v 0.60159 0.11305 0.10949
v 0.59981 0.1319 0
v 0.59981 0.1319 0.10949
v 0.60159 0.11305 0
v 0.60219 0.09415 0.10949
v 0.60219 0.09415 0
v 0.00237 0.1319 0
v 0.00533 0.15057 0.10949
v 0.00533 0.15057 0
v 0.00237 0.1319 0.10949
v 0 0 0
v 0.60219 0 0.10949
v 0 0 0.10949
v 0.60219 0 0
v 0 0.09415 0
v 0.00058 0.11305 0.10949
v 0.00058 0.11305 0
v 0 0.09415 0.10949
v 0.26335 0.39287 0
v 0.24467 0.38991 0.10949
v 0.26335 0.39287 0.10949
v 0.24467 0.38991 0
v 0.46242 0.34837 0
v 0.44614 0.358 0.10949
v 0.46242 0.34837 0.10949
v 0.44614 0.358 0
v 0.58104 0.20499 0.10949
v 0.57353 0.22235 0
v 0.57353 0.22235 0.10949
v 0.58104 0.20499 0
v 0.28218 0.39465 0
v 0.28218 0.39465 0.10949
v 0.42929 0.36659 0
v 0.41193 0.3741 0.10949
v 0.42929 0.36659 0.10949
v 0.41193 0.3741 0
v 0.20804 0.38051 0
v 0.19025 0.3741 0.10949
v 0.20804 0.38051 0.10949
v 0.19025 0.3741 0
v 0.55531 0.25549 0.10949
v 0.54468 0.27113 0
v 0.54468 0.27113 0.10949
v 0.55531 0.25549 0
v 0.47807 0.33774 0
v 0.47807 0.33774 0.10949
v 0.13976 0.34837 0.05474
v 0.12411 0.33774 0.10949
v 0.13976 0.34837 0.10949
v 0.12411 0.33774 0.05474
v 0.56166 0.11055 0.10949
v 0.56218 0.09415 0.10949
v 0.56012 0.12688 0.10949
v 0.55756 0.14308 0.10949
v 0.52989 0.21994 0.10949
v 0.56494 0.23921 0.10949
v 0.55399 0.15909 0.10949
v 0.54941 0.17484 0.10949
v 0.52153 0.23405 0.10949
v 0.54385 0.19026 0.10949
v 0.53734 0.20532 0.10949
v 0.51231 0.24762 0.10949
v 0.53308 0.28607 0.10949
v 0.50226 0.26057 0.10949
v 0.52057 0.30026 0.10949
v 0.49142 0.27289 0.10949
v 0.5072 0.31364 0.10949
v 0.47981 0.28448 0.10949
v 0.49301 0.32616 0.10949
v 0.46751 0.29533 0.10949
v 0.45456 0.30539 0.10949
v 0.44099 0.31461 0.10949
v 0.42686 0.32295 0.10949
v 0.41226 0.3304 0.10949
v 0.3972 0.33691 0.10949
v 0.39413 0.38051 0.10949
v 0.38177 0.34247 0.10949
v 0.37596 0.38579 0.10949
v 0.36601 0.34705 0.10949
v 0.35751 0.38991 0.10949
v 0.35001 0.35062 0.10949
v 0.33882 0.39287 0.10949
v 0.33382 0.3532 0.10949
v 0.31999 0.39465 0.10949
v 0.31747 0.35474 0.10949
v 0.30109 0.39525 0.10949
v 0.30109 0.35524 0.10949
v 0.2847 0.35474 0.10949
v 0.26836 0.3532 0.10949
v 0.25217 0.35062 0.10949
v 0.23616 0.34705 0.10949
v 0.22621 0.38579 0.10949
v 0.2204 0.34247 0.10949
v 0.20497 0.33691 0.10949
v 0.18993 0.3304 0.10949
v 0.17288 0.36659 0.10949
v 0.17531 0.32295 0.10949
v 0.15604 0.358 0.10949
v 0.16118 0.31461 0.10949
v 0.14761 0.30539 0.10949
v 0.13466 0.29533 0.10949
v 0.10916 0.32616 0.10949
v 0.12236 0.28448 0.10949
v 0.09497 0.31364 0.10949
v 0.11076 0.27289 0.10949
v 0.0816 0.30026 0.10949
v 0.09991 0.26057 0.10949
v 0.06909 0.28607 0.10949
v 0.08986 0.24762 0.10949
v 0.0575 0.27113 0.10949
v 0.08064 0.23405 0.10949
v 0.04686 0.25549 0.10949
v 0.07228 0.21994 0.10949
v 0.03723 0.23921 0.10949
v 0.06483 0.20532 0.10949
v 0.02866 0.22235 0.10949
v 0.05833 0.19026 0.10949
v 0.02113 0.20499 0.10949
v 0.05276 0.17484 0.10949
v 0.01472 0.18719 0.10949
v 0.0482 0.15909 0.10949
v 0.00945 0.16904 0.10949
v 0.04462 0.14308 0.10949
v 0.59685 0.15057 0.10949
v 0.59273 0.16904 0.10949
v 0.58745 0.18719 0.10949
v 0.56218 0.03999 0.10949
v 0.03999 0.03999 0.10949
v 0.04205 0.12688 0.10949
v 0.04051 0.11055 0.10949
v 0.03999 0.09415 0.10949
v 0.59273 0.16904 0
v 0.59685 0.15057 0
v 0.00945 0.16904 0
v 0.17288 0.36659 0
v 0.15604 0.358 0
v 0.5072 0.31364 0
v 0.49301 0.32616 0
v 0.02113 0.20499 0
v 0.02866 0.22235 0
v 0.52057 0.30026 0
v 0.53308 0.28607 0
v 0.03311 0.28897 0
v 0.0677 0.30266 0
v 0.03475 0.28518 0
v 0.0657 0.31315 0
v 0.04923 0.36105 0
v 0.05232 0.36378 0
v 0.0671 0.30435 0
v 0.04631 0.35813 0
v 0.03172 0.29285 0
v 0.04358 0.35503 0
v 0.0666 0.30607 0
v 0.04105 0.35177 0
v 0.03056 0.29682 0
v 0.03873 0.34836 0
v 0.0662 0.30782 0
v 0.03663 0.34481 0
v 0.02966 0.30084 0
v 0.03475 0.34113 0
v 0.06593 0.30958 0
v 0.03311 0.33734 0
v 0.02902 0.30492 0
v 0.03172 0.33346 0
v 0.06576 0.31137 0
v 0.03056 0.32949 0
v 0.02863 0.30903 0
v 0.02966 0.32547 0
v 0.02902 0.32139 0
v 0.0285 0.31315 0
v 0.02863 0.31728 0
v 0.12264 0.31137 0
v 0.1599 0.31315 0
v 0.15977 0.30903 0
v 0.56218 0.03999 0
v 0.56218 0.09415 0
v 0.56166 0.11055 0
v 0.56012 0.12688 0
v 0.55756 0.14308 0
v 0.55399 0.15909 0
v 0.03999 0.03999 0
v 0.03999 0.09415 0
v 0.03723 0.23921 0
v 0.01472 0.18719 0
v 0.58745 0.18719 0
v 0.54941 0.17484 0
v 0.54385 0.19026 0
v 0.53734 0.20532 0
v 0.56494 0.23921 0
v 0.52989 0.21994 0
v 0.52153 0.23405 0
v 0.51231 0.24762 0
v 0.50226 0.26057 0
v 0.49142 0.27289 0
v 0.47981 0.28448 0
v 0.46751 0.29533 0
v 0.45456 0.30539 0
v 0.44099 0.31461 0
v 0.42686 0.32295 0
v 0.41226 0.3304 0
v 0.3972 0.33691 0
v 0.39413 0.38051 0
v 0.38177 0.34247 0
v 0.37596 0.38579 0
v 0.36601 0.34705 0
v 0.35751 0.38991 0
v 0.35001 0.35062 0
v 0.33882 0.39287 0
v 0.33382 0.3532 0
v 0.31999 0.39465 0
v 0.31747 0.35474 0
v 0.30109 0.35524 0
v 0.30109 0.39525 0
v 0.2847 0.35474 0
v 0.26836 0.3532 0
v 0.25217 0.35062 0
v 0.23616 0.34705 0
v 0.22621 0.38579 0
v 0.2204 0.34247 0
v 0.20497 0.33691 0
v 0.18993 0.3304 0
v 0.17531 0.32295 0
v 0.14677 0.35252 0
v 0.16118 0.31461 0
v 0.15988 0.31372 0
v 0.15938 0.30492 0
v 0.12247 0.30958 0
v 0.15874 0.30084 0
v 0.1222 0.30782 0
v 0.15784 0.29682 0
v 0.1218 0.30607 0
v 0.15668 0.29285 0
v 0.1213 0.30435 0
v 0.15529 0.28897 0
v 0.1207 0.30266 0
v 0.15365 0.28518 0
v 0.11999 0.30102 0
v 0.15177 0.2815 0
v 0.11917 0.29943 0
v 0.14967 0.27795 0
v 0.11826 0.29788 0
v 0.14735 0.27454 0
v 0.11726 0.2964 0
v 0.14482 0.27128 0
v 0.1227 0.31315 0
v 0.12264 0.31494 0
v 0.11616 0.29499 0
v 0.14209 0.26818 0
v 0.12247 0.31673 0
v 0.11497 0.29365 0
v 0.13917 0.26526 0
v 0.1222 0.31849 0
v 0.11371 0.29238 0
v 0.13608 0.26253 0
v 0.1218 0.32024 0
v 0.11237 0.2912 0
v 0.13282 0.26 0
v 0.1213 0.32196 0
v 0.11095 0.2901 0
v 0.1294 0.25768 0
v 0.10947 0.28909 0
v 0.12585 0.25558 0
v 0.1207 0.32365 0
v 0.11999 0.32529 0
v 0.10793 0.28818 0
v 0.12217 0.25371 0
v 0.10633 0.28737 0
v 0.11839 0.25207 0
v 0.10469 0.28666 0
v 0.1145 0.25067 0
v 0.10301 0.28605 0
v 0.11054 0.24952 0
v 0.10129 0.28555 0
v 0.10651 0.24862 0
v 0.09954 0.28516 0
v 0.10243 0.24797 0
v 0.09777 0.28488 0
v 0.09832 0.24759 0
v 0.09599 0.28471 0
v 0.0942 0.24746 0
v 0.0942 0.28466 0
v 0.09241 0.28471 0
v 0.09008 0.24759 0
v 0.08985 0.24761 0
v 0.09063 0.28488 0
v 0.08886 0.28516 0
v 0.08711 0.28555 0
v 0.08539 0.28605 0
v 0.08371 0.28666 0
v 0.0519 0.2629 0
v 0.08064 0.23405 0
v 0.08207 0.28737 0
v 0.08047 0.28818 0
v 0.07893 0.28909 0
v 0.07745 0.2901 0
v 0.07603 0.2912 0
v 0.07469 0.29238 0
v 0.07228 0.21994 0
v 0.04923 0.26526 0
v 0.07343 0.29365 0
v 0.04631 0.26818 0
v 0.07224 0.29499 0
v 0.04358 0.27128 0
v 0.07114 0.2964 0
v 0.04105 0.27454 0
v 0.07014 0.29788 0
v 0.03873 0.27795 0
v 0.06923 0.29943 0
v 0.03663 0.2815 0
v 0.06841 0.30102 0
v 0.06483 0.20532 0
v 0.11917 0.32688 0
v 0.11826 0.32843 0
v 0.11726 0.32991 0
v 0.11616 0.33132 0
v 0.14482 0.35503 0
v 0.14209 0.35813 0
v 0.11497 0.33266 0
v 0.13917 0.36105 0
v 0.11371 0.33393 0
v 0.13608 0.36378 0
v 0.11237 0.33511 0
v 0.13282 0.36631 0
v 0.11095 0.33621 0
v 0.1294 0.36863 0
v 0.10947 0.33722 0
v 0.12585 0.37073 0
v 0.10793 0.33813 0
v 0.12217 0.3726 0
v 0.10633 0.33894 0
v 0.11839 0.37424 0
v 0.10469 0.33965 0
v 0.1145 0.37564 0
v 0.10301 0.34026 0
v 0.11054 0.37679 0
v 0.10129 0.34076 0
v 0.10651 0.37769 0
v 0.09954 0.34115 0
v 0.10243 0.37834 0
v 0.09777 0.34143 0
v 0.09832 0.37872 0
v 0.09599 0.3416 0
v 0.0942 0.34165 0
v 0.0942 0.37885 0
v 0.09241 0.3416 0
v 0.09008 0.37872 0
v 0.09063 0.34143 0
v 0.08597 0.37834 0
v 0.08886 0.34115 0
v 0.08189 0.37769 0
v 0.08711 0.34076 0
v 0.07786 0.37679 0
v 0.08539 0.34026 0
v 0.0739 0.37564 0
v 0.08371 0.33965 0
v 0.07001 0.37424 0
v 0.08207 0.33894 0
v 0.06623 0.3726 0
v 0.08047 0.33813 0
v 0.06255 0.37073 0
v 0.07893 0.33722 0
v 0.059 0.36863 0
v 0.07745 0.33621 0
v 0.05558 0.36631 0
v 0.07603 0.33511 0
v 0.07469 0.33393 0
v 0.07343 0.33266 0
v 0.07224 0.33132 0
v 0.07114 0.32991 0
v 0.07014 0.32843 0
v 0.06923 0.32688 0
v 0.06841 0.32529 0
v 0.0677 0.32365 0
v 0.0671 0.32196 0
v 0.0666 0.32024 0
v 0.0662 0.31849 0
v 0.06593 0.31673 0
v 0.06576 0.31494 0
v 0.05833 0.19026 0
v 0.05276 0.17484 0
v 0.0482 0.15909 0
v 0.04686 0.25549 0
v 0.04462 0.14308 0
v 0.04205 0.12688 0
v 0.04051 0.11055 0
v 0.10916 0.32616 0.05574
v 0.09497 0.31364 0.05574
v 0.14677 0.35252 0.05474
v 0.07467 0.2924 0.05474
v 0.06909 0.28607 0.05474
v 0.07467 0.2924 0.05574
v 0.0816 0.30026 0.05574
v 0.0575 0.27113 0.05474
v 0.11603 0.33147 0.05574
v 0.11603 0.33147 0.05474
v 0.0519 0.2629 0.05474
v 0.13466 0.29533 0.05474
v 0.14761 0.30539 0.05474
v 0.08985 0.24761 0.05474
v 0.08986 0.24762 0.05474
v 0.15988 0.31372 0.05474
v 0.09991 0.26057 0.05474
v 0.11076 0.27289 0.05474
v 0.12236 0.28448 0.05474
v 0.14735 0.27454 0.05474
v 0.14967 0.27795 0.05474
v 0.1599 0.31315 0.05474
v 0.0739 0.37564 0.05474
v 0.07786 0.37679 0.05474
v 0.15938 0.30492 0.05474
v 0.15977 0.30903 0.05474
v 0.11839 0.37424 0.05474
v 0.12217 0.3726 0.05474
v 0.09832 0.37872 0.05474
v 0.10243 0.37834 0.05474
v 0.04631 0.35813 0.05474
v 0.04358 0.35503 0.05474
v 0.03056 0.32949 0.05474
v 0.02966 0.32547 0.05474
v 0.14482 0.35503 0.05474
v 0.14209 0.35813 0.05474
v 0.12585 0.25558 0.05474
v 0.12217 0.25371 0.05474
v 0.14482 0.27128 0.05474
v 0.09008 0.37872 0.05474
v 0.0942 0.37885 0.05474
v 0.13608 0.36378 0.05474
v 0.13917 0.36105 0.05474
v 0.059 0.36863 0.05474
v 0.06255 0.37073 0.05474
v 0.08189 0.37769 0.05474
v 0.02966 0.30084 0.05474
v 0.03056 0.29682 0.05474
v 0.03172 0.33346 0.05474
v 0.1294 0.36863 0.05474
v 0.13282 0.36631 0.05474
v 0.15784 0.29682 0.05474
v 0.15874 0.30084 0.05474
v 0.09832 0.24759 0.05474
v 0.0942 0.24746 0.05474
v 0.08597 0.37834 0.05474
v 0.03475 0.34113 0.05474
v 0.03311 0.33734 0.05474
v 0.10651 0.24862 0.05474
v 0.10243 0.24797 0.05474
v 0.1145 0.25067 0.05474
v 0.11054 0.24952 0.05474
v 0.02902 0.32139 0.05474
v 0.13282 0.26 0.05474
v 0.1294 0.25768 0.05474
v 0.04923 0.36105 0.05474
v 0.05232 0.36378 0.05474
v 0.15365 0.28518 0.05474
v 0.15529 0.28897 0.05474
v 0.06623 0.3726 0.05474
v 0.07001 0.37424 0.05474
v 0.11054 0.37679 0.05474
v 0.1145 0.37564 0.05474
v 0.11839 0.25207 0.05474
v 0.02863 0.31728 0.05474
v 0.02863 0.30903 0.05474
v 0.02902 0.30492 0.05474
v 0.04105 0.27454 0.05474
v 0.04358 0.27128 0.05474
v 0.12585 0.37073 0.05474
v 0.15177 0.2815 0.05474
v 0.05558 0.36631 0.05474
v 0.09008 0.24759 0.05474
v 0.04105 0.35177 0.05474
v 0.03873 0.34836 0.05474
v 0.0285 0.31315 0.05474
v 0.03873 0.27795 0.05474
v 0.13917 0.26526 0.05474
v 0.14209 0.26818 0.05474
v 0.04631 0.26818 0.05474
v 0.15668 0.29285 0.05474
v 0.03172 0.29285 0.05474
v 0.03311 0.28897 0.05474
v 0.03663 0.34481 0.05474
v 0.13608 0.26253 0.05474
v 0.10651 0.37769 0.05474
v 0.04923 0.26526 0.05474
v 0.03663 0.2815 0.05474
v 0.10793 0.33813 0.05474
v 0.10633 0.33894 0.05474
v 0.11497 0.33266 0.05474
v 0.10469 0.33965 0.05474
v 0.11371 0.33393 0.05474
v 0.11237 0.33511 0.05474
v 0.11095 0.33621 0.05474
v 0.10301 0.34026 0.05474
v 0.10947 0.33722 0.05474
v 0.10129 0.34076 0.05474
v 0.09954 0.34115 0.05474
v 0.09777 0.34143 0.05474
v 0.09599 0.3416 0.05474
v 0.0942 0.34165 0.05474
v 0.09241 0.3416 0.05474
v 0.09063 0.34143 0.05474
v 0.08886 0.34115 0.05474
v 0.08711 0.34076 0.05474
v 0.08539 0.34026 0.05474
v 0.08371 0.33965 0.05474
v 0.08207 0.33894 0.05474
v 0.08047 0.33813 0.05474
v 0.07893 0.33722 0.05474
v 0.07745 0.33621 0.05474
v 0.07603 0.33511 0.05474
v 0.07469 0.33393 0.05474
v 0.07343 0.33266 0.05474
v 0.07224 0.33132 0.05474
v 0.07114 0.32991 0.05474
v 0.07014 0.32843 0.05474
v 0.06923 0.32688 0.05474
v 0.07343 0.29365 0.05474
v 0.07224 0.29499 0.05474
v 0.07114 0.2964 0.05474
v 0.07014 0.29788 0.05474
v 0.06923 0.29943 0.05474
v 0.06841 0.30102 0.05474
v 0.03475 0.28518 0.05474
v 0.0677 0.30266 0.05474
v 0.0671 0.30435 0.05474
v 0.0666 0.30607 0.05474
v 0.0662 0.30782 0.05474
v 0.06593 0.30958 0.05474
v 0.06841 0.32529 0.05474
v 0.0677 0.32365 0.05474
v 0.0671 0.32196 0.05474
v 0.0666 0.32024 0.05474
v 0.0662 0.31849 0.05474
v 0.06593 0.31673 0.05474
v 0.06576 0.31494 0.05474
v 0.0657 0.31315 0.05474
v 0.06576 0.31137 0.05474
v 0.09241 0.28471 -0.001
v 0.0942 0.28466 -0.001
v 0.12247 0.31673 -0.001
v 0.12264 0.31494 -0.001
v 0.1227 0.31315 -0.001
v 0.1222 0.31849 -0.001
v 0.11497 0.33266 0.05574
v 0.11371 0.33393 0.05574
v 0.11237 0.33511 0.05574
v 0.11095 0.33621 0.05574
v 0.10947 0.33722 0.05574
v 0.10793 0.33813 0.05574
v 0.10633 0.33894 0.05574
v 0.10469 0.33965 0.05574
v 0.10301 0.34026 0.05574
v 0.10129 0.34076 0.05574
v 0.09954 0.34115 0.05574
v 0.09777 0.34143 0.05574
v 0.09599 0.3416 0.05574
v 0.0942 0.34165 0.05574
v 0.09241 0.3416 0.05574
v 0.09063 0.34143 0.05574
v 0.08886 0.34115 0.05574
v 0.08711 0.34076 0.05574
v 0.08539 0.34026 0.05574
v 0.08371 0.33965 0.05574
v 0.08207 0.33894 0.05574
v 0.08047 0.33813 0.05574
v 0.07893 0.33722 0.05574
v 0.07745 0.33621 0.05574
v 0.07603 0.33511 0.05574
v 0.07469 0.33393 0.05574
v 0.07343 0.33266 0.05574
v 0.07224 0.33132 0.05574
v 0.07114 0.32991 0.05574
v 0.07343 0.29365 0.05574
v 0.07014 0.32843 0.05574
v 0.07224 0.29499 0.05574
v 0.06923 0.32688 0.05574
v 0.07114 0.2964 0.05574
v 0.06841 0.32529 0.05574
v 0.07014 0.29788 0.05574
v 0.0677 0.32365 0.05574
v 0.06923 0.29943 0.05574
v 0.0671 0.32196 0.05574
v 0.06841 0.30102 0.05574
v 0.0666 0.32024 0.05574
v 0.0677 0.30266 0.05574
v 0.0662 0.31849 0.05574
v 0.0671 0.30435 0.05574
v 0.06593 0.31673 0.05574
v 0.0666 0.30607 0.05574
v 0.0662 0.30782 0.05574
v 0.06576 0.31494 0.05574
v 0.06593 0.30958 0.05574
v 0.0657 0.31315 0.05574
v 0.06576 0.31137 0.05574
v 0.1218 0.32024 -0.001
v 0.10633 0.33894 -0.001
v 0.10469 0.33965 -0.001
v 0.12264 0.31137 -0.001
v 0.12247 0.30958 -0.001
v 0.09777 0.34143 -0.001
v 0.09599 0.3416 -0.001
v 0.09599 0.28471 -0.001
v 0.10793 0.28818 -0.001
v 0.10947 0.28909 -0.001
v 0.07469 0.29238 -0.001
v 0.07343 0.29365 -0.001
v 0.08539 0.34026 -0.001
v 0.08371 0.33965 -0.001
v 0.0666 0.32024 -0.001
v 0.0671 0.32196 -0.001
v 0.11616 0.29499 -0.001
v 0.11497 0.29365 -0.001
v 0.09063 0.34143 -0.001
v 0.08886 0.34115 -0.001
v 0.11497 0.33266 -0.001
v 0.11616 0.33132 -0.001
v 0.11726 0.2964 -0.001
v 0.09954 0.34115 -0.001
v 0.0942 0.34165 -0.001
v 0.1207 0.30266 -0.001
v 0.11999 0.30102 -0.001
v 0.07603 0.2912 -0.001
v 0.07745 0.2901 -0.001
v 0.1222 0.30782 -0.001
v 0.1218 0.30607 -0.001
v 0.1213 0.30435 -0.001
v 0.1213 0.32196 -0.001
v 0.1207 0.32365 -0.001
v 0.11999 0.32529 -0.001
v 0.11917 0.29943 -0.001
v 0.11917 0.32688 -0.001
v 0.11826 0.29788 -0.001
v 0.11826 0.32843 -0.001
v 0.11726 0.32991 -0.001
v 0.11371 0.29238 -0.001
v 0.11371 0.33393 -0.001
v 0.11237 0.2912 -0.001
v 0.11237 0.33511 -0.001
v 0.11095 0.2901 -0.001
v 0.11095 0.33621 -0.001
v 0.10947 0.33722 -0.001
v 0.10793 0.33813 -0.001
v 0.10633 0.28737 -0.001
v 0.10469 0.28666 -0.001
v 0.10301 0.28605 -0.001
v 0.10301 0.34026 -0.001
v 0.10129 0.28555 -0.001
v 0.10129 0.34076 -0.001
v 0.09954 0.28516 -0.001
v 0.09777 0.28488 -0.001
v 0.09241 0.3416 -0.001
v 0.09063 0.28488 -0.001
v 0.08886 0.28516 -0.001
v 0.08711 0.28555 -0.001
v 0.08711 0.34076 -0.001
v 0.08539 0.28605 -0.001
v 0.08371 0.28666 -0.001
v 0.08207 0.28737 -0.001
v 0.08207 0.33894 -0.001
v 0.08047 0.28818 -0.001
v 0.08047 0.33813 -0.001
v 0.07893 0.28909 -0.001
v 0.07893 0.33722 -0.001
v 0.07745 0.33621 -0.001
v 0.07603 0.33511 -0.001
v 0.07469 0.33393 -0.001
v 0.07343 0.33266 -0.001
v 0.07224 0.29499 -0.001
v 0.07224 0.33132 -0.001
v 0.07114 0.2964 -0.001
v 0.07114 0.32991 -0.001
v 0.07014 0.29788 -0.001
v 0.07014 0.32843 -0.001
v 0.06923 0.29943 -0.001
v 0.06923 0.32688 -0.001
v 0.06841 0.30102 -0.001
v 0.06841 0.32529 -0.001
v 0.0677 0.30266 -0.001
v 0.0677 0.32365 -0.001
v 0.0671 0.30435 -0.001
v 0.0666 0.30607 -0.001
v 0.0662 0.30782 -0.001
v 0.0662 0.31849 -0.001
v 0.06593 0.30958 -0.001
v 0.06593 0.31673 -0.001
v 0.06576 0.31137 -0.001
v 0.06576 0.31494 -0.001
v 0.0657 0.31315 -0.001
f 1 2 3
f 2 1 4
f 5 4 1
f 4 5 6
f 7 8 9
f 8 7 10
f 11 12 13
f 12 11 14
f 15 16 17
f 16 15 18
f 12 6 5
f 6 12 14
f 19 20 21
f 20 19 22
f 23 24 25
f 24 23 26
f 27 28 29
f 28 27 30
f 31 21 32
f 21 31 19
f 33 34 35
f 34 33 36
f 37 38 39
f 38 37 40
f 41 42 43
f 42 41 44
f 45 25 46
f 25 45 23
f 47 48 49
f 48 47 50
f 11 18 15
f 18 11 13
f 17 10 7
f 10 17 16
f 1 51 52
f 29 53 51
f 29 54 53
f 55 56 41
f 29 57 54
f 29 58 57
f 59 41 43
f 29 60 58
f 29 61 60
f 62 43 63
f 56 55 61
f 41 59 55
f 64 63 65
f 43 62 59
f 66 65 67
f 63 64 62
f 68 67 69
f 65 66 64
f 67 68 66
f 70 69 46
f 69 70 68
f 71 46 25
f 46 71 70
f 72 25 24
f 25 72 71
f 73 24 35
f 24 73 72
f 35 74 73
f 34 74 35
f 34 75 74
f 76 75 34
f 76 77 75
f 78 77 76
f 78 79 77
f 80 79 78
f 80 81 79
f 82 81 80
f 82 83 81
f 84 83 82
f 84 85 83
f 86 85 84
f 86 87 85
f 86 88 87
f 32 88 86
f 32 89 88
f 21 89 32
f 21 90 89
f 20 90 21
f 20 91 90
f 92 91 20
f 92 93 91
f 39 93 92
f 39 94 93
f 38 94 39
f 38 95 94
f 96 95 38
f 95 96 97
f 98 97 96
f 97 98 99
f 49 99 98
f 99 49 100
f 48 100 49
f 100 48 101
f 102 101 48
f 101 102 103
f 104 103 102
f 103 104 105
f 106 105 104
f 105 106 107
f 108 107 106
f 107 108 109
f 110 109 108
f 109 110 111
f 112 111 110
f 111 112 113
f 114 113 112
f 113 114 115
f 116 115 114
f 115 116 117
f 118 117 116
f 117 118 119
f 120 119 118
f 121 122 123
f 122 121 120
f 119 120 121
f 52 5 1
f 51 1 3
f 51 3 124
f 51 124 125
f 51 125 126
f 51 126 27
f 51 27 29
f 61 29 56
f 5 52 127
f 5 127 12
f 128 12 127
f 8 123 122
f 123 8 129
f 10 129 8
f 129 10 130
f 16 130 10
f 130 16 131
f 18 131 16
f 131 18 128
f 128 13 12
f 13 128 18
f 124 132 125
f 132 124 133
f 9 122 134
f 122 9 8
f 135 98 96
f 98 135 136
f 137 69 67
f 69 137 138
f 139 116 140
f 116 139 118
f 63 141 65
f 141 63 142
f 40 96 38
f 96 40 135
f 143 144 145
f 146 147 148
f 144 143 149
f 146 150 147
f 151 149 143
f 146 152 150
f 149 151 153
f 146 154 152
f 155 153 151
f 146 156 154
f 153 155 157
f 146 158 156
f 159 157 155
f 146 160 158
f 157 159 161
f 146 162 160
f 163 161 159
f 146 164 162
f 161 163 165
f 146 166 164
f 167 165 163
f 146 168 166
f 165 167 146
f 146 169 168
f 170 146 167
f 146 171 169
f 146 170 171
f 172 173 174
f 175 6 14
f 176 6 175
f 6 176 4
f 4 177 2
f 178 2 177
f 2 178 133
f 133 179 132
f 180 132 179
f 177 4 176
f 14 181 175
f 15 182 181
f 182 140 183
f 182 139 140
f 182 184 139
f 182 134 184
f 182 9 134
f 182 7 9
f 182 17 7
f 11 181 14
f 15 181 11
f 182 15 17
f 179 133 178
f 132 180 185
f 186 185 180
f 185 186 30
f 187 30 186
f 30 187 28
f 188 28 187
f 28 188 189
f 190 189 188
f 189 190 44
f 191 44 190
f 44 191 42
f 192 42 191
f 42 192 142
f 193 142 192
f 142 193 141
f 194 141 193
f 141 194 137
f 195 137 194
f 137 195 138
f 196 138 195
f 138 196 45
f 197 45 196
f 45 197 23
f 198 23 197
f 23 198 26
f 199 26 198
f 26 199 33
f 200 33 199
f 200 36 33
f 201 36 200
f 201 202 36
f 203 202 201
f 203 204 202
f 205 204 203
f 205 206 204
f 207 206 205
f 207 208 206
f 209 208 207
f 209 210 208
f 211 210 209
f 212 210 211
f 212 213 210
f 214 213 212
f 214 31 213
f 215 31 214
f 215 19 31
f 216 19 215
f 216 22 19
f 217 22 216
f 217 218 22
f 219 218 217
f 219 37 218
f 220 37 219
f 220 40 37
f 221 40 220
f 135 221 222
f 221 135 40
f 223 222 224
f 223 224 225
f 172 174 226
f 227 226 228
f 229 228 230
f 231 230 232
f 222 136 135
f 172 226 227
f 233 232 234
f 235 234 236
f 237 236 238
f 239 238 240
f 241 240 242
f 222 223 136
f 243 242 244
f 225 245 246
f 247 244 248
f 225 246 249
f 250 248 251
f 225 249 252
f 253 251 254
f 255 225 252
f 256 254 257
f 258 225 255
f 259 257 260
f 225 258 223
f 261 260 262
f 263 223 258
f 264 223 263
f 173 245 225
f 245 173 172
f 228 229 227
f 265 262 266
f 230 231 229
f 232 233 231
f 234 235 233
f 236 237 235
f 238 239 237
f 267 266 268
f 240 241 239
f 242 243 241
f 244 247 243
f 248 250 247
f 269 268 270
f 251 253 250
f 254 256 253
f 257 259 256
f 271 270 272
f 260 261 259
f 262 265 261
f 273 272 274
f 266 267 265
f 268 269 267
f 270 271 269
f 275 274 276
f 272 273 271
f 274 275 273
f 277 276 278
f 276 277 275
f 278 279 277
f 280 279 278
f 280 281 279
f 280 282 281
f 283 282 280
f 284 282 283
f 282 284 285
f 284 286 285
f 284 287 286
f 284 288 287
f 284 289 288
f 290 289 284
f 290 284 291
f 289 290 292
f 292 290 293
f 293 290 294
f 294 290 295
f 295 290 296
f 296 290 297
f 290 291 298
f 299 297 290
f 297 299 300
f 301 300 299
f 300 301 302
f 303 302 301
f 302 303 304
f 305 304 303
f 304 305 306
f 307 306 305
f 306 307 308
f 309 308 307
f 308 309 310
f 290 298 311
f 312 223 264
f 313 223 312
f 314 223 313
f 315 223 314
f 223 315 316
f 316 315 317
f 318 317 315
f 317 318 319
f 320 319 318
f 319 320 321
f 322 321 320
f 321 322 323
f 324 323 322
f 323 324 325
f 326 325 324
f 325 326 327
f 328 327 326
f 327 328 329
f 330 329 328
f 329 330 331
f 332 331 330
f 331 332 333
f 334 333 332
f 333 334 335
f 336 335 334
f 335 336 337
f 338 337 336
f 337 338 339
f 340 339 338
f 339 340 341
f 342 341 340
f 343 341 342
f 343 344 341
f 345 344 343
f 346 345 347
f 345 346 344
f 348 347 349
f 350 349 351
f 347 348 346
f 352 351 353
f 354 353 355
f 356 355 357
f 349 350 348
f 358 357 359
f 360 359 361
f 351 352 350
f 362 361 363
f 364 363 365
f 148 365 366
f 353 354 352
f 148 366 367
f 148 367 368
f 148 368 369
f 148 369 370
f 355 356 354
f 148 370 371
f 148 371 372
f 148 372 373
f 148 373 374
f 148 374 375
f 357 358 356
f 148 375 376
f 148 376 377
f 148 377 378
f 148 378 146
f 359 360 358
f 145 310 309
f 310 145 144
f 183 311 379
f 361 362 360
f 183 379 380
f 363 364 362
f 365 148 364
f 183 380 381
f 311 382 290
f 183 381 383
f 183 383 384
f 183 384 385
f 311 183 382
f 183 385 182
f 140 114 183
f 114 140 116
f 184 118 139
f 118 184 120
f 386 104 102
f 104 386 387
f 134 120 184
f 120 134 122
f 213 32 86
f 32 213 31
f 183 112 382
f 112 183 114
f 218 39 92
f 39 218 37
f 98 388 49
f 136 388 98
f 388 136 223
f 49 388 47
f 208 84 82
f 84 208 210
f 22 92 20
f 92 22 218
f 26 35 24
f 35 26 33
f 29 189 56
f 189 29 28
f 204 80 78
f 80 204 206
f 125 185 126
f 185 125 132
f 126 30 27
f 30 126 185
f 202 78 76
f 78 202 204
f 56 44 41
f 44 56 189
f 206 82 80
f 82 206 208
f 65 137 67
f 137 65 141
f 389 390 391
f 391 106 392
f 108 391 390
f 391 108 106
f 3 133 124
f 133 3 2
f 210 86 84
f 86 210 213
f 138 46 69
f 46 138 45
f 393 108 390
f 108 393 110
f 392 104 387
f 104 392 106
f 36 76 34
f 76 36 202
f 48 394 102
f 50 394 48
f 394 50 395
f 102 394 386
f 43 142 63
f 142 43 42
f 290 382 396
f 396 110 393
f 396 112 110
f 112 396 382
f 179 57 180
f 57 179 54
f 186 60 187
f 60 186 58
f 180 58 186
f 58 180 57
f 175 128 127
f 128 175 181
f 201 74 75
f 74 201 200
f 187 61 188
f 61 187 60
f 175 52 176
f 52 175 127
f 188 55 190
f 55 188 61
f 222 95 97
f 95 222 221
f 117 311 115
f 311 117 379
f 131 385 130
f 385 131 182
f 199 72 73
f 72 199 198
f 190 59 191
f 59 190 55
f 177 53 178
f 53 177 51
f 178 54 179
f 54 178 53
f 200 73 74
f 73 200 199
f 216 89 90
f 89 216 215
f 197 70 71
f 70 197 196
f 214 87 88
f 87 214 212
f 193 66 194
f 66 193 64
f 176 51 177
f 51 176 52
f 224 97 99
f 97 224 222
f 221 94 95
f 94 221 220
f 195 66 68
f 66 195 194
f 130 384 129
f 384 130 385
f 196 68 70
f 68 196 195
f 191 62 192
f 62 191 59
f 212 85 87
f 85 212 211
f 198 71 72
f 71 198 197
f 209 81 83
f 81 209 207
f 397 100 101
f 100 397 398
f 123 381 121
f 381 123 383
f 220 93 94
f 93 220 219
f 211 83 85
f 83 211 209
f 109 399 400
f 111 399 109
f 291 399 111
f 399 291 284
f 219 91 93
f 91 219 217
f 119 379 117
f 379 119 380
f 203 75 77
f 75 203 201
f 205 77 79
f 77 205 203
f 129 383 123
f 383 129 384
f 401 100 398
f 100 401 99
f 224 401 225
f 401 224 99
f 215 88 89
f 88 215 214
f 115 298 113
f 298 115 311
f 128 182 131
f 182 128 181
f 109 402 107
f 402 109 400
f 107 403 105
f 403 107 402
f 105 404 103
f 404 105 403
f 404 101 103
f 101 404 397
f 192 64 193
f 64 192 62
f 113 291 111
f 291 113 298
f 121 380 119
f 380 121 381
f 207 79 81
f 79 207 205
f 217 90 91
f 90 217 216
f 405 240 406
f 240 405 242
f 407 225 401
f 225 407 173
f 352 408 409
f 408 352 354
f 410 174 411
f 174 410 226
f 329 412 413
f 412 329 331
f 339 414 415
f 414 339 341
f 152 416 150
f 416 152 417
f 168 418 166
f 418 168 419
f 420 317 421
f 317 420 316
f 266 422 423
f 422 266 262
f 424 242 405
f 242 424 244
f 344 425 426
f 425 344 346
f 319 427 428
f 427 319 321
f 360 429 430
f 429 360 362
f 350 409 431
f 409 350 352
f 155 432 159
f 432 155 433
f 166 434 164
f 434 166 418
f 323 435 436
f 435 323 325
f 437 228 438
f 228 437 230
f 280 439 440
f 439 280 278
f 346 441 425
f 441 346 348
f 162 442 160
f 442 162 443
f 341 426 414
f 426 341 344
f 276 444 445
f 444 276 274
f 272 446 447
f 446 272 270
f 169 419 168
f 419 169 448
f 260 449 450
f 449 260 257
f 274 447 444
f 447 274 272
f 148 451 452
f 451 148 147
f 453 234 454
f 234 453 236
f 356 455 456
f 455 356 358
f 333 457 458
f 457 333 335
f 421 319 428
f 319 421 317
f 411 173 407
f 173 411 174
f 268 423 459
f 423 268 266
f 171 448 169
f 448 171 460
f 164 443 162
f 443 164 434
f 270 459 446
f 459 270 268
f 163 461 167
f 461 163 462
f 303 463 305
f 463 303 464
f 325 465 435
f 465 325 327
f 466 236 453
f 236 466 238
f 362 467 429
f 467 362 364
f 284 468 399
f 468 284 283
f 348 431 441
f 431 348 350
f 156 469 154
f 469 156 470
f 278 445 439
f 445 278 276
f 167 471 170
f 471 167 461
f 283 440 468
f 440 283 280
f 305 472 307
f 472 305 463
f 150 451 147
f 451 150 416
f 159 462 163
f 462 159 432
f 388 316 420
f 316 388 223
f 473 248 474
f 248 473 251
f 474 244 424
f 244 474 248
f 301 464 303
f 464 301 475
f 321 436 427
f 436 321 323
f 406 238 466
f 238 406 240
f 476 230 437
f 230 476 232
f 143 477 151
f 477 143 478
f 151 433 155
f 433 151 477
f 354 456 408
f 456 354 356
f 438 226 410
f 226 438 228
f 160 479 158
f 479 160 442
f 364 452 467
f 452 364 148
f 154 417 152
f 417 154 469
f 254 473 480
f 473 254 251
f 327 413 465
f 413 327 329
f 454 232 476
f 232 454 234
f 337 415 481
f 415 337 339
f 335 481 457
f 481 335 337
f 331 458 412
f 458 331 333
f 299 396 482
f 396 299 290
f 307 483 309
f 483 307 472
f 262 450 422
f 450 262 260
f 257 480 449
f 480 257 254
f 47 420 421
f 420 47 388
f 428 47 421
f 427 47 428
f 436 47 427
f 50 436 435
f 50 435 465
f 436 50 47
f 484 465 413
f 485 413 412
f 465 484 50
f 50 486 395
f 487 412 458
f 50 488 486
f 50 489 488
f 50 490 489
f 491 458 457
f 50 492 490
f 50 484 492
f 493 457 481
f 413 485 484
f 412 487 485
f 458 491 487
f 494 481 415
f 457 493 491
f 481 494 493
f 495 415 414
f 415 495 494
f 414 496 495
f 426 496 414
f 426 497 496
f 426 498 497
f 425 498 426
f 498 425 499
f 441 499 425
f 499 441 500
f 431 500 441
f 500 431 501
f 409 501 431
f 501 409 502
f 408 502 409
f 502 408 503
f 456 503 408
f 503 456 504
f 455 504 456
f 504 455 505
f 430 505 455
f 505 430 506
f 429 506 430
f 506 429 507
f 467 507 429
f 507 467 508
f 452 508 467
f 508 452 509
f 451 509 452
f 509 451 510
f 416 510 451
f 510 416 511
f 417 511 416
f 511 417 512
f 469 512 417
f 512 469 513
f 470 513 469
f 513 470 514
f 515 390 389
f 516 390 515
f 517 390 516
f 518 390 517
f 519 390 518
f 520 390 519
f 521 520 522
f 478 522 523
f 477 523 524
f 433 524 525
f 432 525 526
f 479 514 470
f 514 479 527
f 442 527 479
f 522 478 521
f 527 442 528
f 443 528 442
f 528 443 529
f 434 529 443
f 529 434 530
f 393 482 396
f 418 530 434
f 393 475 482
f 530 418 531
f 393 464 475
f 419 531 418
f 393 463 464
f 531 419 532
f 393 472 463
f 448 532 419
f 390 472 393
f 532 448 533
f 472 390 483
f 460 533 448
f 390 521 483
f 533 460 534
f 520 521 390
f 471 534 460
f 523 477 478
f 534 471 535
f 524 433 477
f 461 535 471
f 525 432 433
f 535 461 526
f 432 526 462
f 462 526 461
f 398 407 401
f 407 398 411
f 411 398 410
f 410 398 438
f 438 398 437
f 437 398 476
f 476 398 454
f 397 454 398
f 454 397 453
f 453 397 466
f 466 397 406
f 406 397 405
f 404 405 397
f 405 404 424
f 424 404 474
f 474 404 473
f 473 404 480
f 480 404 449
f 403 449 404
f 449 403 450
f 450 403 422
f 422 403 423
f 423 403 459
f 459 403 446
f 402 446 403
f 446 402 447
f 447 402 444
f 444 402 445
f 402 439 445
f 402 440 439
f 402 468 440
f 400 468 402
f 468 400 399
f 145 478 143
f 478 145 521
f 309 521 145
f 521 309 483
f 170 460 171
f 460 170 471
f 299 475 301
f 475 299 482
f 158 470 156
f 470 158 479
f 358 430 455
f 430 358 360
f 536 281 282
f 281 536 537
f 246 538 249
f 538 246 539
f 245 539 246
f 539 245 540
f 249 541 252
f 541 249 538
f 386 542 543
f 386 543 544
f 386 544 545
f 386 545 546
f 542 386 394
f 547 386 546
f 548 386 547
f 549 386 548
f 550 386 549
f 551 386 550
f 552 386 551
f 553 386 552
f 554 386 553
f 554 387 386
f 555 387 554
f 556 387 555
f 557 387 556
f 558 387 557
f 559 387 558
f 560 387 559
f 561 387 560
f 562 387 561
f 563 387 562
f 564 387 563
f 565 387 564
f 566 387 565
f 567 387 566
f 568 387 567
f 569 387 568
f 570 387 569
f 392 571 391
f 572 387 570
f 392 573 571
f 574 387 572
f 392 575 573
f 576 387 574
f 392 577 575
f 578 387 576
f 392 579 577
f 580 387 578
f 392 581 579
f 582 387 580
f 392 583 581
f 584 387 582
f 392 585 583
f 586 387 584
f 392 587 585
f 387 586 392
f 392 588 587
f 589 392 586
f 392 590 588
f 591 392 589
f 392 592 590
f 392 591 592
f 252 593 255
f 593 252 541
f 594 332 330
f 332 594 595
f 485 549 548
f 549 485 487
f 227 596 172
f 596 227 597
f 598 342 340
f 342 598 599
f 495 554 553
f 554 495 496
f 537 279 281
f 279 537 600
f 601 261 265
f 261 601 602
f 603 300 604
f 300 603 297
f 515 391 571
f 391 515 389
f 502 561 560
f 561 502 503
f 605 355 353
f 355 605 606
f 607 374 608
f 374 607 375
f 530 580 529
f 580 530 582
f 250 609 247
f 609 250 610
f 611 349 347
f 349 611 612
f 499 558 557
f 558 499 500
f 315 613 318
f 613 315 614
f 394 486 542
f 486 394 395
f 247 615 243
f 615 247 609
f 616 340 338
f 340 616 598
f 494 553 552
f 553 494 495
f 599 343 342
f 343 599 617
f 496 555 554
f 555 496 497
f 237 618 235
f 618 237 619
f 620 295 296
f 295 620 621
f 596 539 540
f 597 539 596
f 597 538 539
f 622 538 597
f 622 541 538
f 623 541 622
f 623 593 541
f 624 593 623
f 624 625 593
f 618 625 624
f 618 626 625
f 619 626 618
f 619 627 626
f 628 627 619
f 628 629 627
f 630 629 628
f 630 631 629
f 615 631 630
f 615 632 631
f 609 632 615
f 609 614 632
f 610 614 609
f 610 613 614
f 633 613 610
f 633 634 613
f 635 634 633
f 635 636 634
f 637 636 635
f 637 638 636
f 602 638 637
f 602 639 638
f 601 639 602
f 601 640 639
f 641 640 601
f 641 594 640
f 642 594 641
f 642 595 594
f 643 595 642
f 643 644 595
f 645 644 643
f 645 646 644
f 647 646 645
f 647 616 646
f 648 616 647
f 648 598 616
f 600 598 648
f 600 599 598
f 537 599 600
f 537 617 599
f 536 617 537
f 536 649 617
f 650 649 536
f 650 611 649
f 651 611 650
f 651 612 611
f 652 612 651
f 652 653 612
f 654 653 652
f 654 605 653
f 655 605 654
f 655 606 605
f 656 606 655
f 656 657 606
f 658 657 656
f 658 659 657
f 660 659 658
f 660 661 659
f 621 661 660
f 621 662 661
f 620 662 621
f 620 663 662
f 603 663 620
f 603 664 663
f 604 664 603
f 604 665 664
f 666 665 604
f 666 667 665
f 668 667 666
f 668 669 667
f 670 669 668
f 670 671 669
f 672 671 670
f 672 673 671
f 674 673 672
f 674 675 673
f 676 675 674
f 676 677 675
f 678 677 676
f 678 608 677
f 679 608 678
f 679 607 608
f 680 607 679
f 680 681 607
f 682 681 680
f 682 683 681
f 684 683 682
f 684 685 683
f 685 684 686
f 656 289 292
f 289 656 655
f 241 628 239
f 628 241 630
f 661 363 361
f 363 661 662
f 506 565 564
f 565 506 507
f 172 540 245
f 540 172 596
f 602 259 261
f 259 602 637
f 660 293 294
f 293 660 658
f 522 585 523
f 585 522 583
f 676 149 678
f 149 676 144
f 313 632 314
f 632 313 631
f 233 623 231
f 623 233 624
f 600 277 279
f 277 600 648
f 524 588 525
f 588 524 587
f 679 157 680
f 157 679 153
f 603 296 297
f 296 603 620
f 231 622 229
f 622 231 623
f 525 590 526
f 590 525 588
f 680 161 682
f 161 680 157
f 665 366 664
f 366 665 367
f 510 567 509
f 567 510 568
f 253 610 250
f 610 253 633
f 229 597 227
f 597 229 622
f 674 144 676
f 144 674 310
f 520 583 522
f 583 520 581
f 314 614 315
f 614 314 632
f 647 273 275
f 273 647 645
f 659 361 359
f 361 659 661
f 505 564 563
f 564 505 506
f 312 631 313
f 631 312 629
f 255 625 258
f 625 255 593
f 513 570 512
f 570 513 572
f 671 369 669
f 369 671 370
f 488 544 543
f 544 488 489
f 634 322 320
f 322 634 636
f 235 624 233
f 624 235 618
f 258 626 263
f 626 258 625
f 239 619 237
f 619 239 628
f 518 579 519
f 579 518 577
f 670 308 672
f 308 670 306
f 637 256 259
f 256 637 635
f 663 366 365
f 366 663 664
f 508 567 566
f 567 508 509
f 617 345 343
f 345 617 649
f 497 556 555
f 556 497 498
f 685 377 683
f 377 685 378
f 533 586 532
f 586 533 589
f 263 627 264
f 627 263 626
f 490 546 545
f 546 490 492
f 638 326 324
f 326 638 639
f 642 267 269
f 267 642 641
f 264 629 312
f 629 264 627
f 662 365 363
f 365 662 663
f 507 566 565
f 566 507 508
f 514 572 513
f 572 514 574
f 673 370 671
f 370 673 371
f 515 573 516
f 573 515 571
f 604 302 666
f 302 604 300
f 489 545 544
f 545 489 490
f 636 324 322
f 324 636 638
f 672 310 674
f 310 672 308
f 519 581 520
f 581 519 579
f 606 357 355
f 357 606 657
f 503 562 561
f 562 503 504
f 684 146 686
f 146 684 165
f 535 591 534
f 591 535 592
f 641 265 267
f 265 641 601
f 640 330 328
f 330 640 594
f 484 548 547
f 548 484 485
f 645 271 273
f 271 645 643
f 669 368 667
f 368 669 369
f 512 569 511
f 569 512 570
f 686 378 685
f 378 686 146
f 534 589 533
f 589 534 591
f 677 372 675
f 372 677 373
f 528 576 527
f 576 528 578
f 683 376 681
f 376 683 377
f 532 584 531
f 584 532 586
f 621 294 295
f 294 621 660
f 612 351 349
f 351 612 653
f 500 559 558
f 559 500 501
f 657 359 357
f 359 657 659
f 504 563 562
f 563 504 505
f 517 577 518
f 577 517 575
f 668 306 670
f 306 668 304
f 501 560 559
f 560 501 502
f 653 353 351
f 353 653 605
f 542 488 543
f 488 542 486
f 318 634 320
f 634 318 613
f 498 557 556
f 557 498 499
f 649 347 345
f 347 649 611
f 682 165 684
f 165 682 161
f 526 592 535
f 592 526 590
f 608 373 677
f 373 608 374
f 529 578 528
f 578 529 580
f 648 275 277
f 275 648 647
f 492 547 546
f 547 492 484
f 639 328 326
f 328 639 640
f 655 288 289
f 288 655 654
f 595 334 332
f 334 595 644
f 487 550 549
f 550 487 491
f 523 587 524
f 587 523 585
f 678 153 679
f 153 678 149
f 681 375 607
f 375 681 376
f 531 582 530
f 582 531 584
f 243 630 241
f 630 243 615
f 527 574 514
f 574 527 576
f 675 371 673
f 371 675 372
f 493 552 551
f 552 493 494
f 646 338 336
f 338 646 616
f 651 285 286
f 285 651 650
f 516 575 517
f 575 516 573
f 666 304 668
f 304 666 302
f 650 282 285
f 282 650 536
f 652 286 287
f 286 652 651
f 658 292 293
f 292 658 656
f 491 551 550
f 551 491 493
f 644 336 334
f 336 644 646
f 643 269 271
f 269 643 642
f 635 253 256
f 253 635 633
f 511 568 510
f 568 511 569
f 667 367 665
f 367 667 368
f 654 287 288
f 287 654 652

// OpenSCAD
// OpenSCAD parametric model
// All dimensions in inches
$fn = 100;

// Main base dimensions
main_length = 0.395255;  // Y front-back extent
main_width  = 0.60219;   // X left-right extent
main_height = 0.109489;  // Z height
// Derived geometry for D‑shape
// The outer profile consists of a rectangle of height rect_h and a semicircle of radius R
R = main_width / 2;             // 0.301095
rect_h = main_length - R;       // 0.09416 (exact match to axis offset 0.0942)
// Wall thickness (assumed constant, not explicitly given)
wall = 0.04;                     // modify if actual thickness differs

// Round protrusion (boss) parameters
boss_axis_x = 0.0942;                // offset from left edge
boss_front_offset = -0.0821;         // offset from main front edge (negative = inside)
boss_axis_y = main_length + boss_front_offset;   // = 0.313155
boss_radius = 0.0657;
boss_height = 0.054745;              // shallower than main body
hole_radius = 0.0285;

//----------------------------------------------------------------------
// 2D profile of the main D‑shape outer edge
// It is a polygon that goes: bottom‑left, bottom‑right, right straight,
// then semicircle arc from right to left, then left straight back down.
module d_outer_2d() {
    polygon([
        [0, 0],
        [main_width, 0],
        [main_width, rect_h],
        each arc_points(main_width/2, rect_h, R, 0, 180), // arc from angle 0 to 180 (subtends full semi)
        [0, rect_h]
    ]);
}

// Helper: generate points on an arc (for polyhedron / polygon)
// center (cx,cy), radius r, start_angle, end_angle, steps derived from $fn
function arc_points(cx, cy, r, start_ang, end_ang) = [
    for (a = [start_ang : (end_ang-start_ang)/($fn*0.5) : end_ang])
        [cx + r*cos(a), cy + r*sin(a)]
];
// For polygon we need explicit array; define as a module using list comprehension in polygon call.
// Instead, we'll build the arc points directly inside the polygon using a loop.

module d_outer_2d() {
    polygon(
        concat(
            [[0, 0], [main_width, 0], [main_width, rect_h]],
            [ for (a = [0 : 180/($fn/2) : 180]) 
                [main_width/2 + R*cos(a), rect_h + R*sin(a)] ],
            [[0, rect_h]]
        )
    );
}

// 2D profile of the inner hole – offset inward by wall
module d_inner_2d() {
    inner_R = R - wall;
    // Ensure inner dimensions are positive
    assert(inner_R > 0, "Wall thickness too large for the given main dimensions");
    polygon(
        concat(
            [[wall, wall], [main_width - wall, wall], [main_width - wall, rect_h]],
            [ for (a = [0 : 180/($fn/2) : 180])
                [main_width/2 + inner_R*cos(a), rect_h + inner_R*sin(a)] ],
            [[wall, rect_h]]
        )
    );
}

//----------------------------------------------------------------------
// Main solid body: D‑shaped frame (outer minus inner)
module main_frame() {
    difference() {
        linear_extrude(height = main_height, center = false)
            d_outer_2d();
        // Through‑opening (extrude slightly more to ensure clean subtraction)
        translate([0, 0, -0.001])
            linear_extrude(height = main_height + 0.002, center = false)
                d_inner_2d();
    }
}

//----------------------------------------------------------------------
// Round protrusion (boss) – cylinder at the specified axis, shorter than main
module boss() {
    // Boss solid
    cylinder(h = boss_height, r = boss_radius, center = false);
    // Concentric hole
    translate([0, 0, -0.001])
        cylinder(h = boss_height + 0.002, r = hole_radius, center = false);
}

//----------------------------------------------------------------------
// Assemble final part
union() {
    main_frame();
    // Place boss: its axis at (boss_axis_x, boss_axis_y), starting at Z=0
    translate([boss_axis_x, boss_axis_y, 0])
        boss();
}
